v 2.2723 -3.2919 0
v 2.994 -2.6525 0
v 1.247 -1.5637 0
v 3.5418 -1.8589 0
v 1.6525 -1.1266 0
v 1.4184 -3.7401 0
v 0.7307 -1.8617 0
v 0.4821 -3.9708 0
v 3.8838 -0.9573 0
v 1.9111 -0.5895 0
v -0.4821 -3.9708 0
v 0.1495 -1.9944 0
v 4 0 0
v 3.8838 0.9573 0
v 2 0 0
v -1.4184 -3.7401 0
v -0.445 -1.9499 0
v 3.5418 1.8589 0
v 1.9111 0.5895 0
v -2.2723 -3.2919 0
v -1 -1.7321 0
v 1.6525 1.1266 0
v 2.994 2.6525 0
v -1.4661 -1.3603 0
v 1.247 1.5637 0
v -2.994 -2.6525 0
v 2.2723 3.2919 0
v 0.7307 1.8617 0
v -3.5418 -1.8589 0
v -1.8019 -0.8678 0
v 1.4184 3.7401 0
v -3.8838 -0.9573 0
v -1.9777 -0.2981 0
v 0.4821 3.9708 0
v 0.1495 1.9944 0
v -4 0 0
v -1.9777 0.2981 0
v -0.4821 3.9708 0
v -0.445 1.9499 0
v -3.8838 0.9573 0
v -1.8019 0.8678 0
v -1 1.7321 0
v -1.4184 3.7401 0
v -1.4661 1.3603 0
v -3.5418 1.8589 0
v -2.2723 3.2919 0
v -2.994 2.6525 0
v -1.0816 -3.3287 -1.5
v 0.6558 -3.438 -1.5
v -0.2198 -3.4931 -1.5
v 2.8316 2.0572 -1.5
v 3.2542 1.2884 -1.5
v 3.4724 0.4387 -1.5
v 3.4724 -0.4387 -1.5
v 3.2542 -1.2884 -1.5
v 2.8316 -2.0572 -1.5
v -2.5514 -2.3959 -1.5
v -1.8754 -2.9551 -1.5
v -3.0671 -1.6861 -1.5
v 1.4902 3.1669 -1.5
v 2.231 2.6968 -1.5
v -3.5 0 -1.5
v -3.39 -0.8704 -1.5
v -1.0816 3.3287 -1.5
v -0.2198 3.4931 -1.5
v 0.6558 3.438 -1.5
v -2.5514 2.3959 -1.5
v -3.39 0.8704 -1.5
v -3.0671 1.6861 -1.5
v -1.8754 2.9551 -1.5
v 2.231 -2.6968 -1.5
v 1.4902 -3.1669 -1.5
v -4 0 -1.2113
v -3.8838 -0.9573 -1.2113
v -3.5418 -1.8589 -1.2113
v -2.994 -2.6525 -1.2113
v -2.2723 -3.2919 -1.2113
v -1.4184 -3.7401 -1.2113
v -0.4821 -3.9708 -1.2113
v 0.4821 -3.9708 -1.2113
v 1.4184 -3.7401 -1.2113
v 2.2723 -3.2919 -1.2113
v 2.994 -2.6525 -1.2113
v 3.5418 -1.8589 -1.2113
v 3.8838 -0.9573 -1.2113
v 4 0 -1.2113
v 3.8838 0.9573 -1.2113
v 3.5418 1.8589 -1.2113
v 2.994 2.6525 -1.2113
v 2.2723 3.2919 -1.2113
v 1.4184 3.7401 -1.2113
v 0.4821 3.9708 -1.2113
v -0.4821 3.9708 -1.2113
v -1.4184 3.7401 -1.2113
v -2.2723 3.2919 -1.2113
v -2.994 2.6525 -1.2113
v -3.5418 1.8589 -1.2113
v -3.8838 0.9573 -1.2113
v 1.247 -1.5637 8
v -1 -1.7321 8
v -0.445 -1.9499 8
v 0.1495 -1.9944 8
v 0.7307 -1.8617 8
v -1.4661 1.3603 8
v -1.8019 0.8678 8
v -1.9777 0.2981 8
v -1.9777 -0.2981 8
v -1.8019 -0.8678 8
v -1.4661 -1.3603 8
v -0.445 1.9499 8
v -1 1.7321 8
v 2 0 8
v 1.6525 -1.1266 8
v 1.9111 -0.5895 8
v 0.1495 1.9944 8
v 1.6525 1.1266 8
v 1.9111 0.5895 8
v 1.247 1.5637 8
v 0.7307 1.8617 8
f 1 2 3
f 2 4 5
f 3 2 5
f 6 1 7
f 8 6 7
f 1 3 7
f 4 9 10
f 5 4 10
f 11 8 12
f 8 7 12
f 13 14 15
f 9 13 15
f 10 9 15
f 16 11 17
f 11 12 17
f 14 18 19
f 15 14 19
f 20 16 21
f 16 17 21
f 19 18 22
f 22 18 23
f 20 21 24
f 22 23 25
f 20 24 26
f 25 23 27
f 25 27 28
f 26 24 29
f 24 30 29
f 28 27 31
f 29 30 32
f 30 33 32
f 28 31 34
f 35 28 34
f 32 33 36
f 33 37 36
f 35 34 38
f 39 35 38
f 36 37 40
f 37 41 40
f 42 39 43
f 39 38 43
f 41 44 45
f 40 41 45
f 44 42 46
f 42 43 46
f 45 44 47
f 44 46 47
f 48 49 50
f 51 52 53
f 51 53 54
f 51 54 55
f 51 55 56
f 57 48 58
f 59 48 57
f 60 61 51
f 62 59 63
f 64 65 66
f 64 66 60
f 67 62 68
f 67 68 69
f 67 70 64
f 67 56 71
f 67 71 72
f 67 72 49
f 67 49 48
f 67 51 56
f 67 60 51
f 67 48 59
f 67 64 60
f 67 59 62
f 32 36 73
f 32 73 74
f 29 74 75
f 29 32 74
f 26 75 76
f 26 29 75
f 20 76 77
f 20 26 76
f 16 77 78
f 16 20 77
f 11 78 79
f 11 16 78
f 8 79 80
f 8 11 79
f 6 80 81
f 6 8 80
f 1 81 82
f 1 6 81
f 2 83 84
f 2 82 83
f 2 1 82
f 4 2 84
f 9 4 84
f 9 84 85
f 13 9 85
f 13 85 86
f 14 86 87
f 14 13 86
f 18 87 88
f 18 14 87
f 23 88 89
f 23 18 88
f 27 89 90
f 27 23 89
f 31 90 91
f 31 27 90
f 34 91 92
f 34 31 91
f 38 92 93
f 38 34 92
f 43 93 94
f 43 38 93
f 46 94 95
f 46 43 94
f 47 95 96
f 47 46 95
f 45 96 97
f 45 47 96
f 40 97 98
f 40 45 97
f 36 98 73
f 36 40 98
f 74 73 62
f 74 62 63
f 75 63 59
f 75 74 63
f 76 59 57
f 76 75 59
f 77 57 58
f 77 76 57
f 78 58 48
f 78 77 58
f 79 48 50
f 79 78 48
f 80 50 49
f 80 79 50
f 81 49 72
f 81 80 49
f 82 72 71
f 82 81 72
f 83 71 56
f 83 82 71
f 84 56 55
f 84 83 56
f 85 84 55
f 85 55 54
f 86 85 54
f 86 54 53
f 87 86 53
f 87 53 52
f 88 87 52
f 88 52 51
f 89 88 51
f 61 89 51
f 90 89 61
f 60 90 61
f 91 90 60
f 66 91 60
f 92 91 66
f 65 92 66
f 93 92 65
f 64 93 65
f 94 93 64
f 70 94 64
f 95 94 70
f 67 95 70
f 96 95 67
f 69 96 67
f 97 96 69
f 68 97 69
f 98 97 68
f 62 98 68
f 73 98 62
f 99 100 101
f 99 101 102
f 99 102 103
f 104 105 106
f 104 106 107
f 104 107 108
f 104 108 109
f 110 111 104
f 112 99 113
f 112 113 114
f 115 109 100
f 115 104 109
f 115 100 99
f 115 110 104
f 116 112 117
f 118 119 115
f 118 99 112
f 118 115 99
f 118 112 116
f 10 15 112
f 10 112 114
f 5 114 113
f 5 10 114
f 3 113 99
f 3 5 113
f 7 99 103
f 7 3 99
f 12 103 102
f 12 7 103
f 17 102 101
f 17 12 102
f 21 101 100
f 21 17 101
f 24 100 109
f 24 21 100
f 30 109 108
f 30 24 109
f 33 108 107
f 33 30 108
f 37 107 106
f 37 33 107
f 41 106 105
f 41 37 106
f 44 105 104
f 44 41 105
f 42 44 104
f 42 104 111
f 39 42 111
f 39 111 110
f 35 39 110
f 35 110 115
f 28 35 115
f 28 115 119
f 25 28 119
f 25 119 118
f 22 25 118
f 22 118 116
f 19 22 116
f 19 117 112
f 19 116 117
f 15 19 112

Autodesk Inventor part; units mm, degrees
ref_plane "YZ Plane" through (0, 0, 0) normal (1, 0, 0) x (0, 1, 0)
ref_plane "XZ Plane" through (0, 0, 0) normal (0, 1, 0) x (-1, 0, 0)
ref_plane "XY Plane" through (0, 0, 0) normal (0, 0, 1) x (1, 0, 0)
sketch "スケッチ1" plane through (0, 0, 0) normal (0, 0, 1) x (1, 0, 0)
  circle A0 centre (0, 0) radius 2
  dimension "d0" = 4
extrude "押し出し1" add sketch "スケッチ1" along normal blind 8
sketch "スケッチ2" plane through (0, 0, 0) normal (0, 0, -1) x (-1, 0, 0)
  circle A0 centre (0, 0) radius 4
  dimension "d3" = 8
extrude "押し出し2" add sketch "スケッチ2" along normal blind 1.5
thread "ねじ1" size "M4x0.7" class "6g" standard "ANSI Metric M Profile" full length
chamfer "面取り1" distance 0.5 angle 30 1 edges at (4, 0, -1.5) measured on face at (-0.7574, 1.0973, -1.5)
properties part number "ネジローヘッドm4,08" material "鋼、高強度、低合金"
